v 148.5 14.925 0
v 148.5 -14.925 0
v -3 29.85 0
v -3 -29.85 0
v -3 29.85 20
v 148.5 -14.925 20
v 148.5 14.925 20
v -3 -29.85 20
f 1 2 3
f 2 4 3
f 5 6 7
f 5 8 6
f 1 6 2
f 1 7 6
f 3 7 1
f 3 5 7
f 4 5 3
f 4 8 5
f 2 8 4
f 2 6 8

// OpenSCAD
module poly_extrude(h, l_scale = 1, orient = [0, 0, 0], scale = [1, 1, 1]) {
    scale([l_scale, l_scale, l_scale]) rotate(orient) scale(scale) linear_extrude(height = h) children();
}

module circle_extrude(h, r, l_scale = 1, orient = [0, 0, 0], scale = [1, 1, 1]) {
    scale([l_scale, l_scale, l_scale]) rotate(orient) scale(scale) linear_extrude(height = h) circle(r);
}

module polyline_extrude(h, points, closed = true, l_scale = 1, orient = [0, 0, 0], scale = [1, 1, 1]) {
    scale([l_scale, l_scale, l_scale]) rotate(orient) scale(scale) linear_extrude(height = h) polygon(points = points, closed = closed);
}

polyline_extrude(20, [[-3, -29.8496], [148.5, -14.9248], [148.5, 14.9248], [-3, 29.8496]], closed = true)
    circle_extrude(20, 22, closed = true)
        circle(9);
